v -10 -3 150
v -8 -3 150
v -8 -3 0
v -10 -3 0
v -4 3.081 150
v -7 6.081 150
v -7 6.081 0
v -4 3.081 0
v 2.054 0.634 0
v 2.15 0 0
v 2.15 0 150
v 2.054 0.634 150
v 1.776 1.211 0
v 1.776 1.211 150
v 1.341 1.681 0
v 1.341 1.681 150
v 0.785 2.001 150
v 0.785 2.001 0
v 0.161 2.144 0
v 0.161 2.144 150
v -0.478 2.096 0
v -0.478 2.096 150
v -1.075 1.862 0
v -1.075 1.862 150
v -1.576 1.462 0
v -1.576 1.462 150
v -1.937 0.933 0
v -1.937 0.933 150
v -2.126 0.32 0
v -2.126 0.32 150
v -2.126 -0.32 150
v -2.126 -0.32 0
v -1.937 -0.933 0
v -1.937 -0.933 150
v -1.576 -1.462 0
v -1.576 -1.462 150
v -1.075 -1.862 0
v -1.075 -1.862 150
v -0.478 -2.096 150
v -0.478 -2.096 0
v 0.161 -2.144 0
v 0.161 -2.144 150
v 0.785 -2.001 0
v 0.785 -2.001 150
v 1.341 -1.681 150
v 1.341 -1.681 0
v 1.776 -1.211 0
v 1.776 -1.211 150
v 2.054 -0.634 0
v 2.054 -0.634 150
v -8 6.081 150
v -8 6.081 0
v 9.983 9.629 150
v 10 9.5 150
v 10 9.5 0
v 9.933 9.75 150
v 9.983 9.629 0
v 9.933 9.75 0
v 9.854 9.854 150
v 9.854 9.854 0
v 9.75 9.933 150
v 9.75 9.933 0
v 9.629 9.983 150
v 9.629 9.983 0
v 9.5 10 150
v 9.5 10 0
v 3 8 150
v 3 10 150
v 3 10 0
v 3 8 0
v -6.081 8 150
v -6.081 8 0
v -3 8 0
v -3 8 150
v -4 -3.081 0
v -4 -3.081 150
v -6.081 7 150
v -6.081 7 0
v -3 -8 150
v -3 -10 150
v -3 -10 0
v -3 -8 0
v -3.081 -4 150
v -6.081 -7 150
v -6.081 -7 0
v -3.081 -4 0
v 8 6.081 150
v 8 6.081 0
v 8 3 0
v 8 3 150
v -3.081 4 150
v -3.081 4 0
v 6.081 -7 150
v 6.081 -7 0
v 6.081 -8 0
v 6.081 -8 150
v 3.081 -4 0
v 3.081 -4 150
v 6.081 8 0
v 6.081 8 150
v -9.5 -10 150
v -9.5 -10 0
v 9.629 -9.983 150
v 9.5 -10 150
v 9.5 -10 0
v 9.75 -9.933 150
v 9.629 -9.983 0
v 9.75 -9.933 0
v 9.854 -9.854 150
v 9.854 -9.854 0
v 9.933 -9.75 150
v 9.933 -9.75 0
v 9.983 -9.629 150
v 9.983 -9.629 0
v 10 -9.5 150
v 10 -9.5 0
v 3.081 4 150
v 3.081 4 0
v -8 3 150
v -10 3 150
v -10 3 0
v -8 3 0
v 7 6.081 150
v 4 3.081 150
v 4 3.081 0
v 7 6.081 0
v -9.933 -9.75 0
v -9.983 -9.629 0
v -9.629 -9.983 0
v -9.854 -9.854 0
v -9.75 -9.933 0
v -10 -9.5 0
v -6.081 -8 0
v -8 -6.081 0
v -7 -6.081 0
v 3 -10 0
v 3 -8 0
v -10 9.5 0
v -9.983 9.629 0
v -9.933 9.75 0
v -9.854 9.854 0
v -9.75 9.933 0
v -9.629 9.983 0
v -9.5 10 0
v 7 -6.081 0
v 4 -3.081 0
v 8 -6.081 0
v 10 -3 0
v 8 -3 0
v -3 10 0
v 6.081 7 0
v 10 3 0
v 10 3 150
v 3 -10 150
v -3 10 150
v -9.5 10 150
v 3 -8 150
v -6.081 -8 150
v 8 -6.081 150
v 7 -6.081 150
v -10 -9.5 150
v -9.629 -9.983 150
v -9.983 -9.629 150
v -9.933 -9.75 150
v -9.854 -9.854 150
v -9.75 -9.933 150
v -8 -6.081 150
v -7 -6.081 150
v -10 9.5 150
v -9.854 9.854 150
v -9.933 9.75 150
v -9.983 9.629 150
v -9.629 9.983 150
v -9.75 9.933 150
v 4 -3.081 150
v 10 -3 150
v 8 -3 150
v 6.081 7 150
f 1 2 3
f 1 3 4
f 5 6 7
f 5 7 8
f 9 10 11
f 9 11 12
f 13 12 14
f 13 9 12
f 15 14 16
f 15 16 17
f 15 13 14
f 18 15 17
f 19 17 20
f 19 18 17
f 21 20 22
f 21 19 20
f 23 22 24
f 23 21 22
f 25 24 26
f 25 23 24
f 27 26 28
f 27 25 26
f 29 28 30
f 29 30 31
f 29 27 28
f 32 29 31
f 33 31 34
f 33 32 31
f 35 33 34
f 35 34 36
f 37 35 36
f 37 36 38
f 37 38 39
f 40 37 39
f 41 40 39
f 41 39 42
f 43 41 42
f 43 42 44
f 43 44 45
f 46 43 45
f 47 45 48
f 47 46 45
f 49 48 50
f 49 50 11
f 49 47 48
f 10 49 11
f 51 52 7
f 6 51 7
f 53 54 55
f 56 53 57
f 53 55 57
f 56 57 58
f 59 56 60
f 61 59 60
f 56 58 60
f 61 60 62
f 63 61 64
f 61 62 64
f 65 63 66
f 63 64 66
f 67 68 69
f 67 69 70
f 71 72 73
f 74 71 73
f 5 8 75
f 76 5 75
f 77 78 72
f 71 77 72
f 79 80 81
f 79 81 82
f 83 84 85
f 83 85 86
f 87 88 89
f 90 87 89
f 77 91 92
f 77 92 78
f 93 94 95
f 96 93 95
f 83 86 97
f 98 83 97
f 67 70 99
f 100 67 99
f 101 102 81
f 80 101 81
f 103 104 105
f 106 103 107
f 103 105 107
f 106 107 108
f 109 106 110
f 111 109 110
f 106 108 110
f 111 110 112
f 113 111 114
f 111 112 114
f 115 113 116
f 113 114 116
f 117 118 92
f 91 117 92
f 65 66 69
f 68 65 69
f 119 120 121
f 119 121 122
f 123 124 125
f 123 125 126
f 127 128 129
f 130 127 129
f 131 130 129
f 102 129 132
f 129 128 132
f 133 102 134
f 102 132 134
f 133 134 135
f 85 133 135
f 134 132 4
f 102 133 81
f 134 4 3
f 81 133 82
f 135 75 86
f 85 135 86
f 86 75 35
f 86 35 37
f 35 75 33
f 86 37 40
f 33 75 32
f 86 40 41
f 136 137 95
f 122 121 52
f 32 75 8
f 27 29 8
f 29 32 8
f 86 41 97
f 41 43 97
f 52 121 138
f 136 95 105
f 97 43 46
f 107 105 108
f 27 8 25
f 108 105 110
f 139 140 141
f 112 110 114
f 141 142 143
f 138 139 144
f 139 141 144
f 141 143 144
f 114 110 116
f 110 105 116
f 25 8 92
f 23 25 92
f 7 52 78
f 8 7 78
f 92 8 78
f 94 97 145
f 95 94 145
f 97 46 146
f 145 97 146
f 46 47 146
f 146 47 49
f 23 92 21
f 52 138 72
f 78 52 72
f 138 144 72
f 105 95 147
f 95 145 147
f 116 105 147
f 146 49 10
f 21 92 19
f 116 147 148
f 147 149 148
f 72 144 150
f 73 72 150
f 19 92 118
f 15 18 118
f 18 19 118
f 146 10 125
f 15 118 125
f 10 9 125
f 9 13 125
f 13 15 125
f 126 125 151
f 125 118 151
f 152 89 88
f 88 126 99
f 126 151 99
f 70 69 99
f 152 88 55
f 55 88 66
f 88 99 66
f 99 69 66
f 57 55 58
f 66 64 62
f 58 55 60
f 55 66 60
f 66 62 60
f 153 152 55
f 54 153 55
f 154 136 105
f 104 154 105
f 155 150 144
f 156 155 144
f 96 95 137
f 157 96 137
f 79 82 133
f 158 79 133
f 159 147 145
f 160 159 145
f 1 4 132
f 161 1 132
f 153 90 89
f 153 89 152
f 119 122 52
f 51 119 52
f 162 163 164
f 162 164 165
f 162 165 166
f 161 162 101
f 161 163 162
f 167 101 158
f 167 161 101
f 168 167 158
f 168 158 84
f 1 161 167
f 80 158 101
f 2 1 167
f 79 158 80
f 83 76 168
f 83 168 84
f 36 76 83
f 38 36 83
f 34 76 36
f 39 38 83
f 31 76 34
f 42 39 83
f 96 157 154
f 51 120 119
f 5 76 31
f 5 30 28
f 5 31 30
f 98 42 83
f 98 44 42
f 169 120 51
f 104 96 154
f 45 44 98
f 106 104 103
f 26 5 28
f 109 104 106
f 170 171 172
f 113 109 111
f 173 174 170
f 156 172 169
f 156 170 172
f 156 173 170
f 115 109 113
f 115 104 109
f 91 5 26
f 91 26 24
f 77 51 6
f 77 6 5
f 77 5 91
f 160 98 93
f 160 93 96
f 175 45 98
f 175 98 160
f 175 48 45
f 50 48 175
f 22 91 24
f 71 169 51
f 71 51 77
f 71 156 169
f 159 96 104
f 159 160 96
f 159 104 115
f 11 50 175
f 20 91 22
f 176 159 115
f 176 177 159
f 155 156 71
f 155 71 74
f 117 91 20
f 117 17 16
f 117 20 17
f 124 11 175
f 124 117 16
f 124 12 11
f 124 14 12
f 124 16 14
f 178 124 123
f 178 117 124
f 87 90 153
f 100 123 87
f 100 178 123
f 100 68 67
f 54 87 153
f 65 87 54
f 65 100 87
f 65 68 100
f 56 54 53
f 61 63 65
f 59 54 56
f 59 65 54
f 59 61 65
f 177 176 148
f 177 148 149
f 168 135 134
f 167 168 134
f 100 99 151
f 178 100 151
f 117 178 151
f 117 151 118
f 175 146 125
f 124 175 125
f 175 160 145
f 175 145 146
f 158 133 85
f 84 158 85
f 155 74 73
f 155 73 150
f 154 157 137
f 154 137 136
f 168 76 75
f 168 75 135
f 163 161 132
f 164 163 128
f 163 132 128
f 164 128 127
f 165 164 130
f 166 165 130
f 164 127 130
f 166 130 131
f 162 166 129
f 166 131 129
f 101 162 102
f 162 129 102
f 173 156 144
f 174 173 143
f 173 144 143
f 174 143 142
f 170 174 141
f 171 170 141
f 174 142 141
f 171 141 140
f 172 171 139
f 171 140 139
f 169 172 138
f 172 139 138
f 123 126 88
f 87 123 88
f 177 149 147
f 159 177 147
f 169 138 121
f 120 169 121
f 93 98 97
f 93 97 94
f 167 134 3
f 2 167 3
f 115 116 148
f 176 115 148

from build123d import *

# Parameters (mm, degrees)
SKETCH1_R           = 2.15
BOSS_EXTRUDE1_DEPTH = 150


with BuildPart() as part:
    # Sketch1 → Boss-Extrude1 (new body)
    with BuildSketch(Plane.XY):
        with BuildLine():
            Line((-3, 10), (-9.5, 10))
            ThreePointArc((-9.5, 10), (-9.853553391, 9.853553391), (-10, 9.5))
            Line((-10, 9.5), (-10, 3))
            Line((-10, 3), (-8, 3))
            Line((-8, 3), (-8, 6.080761184))
            Line((-8, 6.080761184), (-7, 6.080761184))
            Line((-7, 6.080761184), (-4, 3.080761184))
            Line((-4, 3.080761184), (-4, -3.080761184))
            Line((-4, -3.080761184), (-7, -6.080761184))
            Line((-7, -6.080761184), (-8, -6.080761184))
            Line((-8, -6.080761184), (-8, -3))
            Line((-8, -3), (-10, -3))
            Line((-10, -3), (-10, -9.5))
            ThreePointArc((-10, -9.5), (-9.853553391, -9.853553391), (-9.5, -10))
            Line((-9.5, -10), (-3, -10))
            Line((-3, -10), (-3, -8))
            Line((-3, -8), (-6.080761184, -8))
            Line((-6.080761184, -8), (-6.080761184, -7))
            Line((-6.080761184, -7), (-3.080761184, -4))
            Line((-3.080761184, -4), (3.080761184, -4))
            Line((3.080761184, -4), (6.080761184, -7))
            Line((6.080761184, -7), (6.080761184, -8))
            Line((6.080761184, -8), (3, -8))
            Line((3, -8), (3, -10))
            Line((3, -10), (9.5, -10))
            ThreePointArc((9.5, -10), (9.853553391, -9.853553391), (10, -9.5))
            Line((10, -9.5), (10, -3))
            Line((10, -3), (8, -3))
            Line((8, -3), (8, -6.080761184))
            Line((8, -6.080761184), (7, -6.080761184))
            Line((7, -6.080761184), (4, -3.080761184))
            Line((4, -3.080761184), (4, 3.080761184))
            Line((4, 3.080761184), (7, 6.080761184))
            Line((7, 6.080761184), (8, 6.080761184))
            Line((8, 6.080761184), (8, 3))
            Line((8, 3), (10, 3))
            Line((10, 3), (10, 9.5))
            ThreePointArc((10, 9.5), (9.853553391, 9.853553391), (9.5, 10))
            Line((9.5, 10), (3, 10))
            Line((3, 10), (3, 8))
            Line((3, 8), (6.080761184, 8))
            Line((6.080761184, 8), (6.080761184, 7))
            Line((6.080761184, 7), (3.080761184, 4))
            Line((3.080761184, 4), (-3.080761184, 4))
            Line((-3.080761184, 4), (-6.080761184, 7))
            Line((-6.080761184, 7), (-6.080761184, 8))
            Line((-6.080761184, 8), (-3, 8))
            Line((-3, 8), (-3, 10))
        make_face()
        Circle(SKETCH1_R, mode=Mode.SUBTRACT)
    extrude(amount=BOSS_EXTRUDE1_DEPTH)


solid = part.part
